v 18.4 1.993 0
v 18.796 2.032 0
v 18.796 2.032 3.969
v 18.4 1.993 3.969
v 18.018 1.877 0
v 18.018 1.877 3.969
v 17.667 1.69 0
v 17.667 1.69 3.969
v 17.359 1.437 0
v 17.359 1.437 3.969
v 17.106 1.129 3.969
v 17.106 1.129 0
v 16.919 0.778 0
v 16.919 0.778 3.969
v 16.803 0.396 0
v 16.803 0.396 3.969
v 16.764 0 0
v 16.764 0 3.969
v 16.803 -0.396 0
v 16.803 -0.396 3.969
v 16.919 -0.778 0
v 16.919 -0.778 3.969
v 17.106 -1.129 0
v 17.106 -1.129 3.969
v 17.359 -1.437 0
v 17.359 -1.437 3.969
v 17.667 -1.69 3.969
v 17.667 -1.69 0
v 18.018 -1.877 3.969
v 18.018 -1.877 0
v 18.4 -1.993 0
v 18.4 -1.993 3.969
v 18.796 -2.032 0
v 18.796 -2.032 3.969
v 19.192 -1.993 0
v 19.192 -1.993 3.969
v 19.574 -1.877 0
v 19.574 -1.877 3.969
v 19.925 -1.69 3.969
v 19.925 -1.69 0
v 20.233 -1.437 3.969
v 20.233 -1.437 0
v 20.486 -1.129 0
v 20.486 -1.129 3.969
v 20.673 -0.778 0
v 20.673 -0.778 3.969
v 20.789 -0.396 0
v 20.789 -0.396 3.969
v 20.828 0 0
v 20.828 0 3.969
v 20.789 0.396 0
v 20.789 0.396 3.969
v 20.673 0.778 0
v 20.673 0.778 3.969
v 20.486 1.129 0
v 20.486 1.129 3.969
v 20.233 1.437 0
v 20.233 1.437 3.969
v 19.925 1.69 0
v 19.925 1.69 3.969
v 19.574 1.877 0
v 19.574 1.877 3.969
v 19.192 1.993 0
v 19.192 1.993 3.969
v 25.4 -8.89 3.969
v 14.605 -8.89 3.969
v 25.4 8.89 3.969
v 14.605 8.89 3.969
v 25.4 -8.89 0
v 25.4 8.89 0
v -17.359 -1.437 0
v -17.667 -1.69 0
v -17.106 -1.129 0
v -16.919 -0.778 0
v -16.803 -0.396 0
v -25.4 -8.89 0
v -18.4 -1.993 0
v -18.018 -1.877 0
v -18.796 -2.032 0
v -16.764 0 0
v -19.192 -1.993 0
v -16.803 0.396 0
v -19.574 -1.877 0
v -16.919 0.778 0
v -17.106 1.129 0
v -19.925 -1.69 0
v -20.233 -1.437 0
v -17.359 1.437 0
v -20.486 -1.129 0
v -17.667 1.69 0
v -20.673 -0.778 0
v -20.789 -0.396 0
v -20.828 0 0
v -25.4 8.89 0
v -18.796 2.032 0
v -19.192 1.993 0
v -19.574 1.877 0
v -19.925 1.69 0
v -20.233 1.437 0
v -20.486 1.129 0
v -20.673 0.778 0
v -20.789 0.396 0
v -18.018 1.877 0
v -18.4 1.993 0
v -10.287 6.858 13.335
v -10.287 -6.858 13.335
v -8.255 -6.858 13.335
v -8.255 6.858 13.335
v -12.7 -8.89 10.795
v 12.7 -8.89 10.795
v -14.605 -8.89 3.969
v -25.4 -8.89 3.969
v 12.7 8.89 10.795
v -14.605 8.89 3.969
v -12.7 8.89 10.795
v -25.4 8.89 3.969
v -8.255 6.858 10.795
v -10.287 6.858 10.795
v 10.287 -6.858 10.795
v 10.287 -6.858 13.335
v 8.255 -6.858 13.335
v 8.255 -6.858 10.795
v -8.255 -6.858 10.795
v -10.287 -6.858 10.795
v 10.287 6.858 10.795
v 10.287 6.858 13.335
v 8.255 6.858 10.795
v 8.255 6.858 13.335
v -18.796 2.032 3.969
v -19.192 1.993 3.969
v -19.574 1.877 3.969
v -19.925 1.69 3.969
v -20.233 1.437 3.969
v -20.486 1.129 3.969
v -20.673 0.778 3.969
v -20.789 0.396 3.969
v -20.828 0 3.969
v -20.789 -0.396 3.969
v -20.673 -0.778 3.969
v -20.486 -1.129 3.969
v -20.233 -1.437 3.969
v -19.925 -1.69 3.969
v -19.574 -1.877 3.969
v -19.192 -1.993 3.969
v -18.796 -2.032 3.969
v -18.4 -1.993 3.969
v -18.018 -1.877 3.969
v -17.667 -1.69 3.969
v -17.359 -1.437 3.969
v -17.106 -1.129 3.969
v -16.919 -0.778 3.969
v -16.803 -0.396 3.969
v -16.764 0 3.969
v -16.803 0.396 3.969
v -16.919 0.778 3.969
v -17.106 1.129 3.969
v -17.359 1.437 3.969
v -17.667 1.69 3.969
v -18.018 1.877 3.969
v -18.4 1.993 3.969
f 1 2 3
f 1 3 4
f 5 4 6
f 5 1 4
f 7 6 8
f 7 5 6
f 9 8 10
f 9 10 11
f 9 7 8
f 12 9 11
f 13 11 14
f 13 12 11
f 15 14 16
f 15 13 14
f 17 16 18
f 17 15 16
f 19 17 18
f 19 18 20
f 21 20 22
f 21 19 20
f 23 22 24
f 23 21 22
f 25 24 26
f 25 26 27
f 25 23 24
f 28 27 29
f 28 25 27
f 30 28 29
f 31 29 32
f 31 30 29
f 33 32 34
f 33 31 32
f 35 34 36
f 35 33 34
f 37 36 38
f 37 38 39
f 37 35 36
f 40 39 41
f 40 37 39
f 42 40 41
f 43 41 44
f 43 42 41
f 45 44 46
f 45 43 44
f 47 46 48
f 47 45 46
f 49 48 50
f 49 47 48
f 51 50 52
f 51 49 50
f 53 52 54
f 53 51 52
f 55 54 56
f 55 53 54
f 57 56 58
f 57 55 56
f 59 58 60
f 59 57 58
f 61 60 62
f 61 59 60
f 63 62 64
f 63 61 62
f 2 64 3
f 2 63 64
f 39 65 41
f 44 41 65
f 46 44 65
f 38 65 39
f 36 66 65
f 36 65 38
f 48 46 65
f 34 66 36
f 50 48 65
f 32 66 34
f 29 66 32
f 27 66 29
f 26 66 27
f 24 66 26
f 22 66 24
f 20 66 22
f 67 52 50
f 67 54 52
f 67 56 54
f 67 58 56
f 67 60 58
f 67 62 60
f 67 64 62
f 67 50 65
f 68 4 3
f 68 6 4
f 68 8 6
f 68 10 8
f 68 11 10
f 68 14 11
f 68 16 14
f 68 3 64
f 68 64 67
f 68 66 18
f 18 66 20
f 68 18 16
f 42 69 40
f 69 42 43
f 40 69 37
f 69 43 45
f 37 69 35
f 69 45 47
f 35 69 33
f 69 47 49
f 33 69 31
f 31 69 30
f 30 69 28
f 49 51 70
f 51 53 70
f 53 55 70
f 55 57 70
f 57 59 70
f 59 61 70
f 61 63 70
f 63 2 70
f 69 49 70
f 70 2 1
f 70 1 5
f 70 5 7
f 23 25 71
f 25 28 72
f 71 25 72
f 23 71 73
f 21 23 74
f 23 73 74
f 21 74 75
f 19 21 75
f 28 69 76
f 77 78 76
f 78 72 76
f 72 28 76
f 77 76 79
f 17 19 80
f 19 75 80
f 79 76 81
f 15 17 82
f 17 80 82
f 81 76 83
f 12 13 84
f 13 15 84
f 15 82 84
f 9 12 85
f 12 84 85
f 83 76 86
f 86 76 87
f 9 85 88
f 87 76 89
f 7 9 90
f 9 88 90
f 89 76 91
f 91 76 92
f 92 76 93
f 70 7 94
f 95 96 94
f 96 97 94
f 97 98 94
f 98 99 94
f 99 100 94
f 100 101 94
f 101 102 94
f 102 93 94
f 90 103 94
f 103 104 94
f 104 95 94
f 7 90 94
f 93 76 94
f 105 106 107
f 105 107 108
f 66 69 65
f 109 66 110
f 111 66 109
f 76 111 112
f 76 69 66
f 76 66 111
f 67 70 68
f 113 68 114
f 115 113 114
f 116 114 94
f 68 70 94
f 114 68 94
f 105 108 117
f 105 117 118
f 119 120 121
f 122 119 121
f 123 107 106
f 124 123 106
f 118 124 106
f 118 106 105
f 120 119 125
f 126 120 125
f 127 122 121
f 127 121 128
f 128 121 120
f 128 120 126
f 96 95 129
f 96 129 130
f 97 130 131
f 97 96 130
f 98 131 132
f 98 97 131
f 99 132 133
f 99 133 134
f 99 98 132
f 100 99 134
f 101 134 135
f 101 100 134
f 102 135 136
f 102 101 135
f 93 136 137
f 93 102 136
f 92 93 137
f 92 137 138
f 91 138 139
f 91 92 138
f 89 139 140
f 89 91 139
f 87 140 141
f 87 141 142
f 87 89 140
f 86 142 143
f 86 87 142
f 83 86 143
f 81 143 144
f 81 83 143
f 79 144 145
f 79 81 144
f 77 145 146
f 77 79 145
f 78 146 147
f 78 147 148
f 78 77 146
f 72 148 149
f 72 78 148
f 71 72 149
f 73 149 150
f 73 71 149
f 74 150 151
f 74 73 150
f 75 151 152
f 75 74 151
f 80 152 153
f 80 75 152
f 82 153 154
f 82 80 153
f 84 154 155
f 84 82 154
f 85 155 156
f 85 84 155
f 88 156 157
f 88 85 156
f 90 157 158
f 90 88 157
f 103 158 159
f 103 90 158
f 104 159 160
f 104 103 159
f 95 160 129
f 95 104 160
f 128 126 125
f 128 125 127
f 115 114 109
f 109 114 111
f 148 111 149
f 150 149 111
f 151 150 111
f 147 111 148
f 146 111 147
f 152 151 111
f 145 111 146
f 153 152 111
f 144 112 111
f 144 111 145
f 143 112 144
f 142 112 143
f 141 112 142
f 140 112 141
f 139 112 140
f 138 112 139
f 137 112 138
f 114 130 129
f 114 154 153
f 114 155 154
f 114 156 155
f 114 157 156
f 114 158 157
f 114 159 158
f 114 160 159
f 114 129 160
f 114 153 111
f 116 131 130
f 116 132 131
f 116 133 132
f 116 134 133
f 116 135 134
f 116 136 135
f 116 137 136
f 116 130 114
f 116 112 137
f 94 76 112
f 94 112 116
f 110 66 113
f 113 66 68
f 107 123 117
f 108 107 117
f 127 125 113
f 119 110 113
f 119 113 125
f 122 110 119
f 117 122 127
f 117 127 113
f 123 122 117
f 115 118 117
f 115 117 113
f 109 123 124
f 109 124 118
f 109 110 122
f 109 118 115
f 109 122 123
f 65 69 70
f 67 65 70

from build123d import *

# Parameters (mm, degrees)
SKETCH1_W             = 17.78
SKETCH1_H             = 50.8
SKETCH1_R             = 2.032
BOSS_EXTRUDE1_DEPTH   = 3.96875
SKETCH3_W             = 17.78
SKETCH3_H             = 25.4
SKETCH2_W             = 17.78
SKETCH2_H             = 29.21
SKETCH4_W             = 13.716
SKETCH4_H             = 2.032
BOSS_EXTRUDE2_DEPTH   = 2.54
EXTRUDE_THIN1_DEPTH   = 14.2875
FILLET1_R             = 2.54
CUT_EXTRUDE1_DEPTH    = 0.9525
SKETCH8_R             = 1.27
CUT_EXTRUDE2_DEPTH    = 0.9525
BODY_MOVE_COPY3_ANGLE = 90


with BuildPart() as part:
    # Sketch1 → Boss-Extrude1 (new body)
    with BuildSketch(Plane.XY):
        Rectangle(SKETCH1_W, SKETCH1_H)
        with Locations((0, 18.796)):
            Circle(SKETCH1_R, mode=Mode.SUBTRACT)
        with Locations((0, -18.796)):
            Circle(SKETCH1_R, mode=Mode.SUBTRACT)
    extrude(amount=BOSS_EXTRUDE1_DEPTH)

    # Sketch3 → Loft1 section 0
    with BuildSketch(Plane.XY.offset(10.795)):
        Rectangle(SKETCH3_W, SKETCH3_H)
    # Sketch2 → Loft1 section 1
    with BuildSketch(Plane.XY.offset(3.96875)):
        Rectangle(SKETCH2_W, SKETCH2_H)
    loft()

    # Sketch4 → Boss-Extrude2 (add)
    with BuildSketch(Plane.XY.offset(10.795)):
        with Locations((0, 9.271)):
            Rectangle(SKETCH4_W, SKETCH4_H)
        with Locations((0, -9.271)):
            Rectangle(SKETCH4_W, SKETCH4_H)
    extrude(amount=BOSS_EXTRUDE2_DEPTH)


with BuildPart() as body_2:
    # Sketch6 → Extrude-Thin1 (new body, symmetric)
    with BuildSketch(Plane(origin=(0, 0, 0), x_dir=(1, 0, 0), z_dir=(0, 1, 0))):
        with BuildLine():
            Line((9.525, -13.335), (-6.985, -13.335))
            ThreePointArc((-6.985, -13.335), (-8.781051224, -14.078948776), (-9.525, -15.875))
            Line((-9.525, -15.875), (-9.525, -31.877))
            Line((-9.525, -31.877), (-8.5725, -31.877))
            Line((-8.5725, -31.877), (-8.5725, -15.875))
            ThreePointArc((-8.5725, -15.875), (-8.107532015, -14.752467985), (-6.985, -14.2875))
            Line((-6.985, -14.2875), (9.525, -14.2875))
            Line((9.525, -14.2875), (9.525, -13.335))
        make_face()
    extrude(amount=EXTRUDE_THIN1_DEPTH, both=True)

    # Fillet1
    fillet1_edges = [body_2.edges().sort_by_distance(p)[0] for p in [
        (9.525, 14.2875, 13.81125),
        (-9.04875, 14.2875, 31.877),
        (9.525, -14.2875, 13.81125),
        (-9.04875, -14.2875, 31.877),
    ]]
    fillet(fillet1_edges, radius=FILLET1_R)

    # Sketch7 → Cut-Extrude1 (cut)
    with BuildSketch(Plane.ZY.offset(9.525)):
        with BuildLine():
            Line((19.304, 11.303), (25.273, 11.303))
            ThreePointArc((25.273, 11.303), (27.051, 9.525), (25.273, 7.747))
            Line((25.273, 7.747), (19.304, 7.747))
            ThreePointArc((19.304, 7.747), (17.526, 9.525), (19.304, 11.303))
        make_face()
        with BuildLine():
            Line((19.304, -7.747), (25.273, -7.747))
            ThreePointArc((25.273, -7.747), (27.051, -9.525), (25.273, -11.303))
            Line((25.273, -11.303), (19.304, -11.303))
            ThreePointArc((19.304, -11.303), (17.526, -9.525), (19.304, -7.747))
        make_face()
    extrude(amount=-CUT_EXTRUDE1_DEPTH, mode=Mode.SUBTRACT)

    # Sketch8 → Cut-Extrude2 (cut)
    with BuildSketch(Plane(origin=(-8.5725, 0, 0), x_dir=(0, 0, -1), z_dir=(1, 0, 0))):
        with Locations((-29.083, 0)):
            Circle(SKETCH8_R)
    extrude(amount=-CUT_EXTRUDE2_DEPTH, mode=Mode.SUBTRACT)


with BuildPart() as body_2_1:
    # Body-Move/Copy1: moved
    add(body_2.part.moved(Location((0, 0, 25.4))))


with BuildPart() as part_1:
    # Body-Move/Copy3: moved
    add(part.part.rotate(Axis((0, 0, 0), (0, 0, 1)), BODY_MOVE_COPY3_ANGLE))


solid = part_1.part
